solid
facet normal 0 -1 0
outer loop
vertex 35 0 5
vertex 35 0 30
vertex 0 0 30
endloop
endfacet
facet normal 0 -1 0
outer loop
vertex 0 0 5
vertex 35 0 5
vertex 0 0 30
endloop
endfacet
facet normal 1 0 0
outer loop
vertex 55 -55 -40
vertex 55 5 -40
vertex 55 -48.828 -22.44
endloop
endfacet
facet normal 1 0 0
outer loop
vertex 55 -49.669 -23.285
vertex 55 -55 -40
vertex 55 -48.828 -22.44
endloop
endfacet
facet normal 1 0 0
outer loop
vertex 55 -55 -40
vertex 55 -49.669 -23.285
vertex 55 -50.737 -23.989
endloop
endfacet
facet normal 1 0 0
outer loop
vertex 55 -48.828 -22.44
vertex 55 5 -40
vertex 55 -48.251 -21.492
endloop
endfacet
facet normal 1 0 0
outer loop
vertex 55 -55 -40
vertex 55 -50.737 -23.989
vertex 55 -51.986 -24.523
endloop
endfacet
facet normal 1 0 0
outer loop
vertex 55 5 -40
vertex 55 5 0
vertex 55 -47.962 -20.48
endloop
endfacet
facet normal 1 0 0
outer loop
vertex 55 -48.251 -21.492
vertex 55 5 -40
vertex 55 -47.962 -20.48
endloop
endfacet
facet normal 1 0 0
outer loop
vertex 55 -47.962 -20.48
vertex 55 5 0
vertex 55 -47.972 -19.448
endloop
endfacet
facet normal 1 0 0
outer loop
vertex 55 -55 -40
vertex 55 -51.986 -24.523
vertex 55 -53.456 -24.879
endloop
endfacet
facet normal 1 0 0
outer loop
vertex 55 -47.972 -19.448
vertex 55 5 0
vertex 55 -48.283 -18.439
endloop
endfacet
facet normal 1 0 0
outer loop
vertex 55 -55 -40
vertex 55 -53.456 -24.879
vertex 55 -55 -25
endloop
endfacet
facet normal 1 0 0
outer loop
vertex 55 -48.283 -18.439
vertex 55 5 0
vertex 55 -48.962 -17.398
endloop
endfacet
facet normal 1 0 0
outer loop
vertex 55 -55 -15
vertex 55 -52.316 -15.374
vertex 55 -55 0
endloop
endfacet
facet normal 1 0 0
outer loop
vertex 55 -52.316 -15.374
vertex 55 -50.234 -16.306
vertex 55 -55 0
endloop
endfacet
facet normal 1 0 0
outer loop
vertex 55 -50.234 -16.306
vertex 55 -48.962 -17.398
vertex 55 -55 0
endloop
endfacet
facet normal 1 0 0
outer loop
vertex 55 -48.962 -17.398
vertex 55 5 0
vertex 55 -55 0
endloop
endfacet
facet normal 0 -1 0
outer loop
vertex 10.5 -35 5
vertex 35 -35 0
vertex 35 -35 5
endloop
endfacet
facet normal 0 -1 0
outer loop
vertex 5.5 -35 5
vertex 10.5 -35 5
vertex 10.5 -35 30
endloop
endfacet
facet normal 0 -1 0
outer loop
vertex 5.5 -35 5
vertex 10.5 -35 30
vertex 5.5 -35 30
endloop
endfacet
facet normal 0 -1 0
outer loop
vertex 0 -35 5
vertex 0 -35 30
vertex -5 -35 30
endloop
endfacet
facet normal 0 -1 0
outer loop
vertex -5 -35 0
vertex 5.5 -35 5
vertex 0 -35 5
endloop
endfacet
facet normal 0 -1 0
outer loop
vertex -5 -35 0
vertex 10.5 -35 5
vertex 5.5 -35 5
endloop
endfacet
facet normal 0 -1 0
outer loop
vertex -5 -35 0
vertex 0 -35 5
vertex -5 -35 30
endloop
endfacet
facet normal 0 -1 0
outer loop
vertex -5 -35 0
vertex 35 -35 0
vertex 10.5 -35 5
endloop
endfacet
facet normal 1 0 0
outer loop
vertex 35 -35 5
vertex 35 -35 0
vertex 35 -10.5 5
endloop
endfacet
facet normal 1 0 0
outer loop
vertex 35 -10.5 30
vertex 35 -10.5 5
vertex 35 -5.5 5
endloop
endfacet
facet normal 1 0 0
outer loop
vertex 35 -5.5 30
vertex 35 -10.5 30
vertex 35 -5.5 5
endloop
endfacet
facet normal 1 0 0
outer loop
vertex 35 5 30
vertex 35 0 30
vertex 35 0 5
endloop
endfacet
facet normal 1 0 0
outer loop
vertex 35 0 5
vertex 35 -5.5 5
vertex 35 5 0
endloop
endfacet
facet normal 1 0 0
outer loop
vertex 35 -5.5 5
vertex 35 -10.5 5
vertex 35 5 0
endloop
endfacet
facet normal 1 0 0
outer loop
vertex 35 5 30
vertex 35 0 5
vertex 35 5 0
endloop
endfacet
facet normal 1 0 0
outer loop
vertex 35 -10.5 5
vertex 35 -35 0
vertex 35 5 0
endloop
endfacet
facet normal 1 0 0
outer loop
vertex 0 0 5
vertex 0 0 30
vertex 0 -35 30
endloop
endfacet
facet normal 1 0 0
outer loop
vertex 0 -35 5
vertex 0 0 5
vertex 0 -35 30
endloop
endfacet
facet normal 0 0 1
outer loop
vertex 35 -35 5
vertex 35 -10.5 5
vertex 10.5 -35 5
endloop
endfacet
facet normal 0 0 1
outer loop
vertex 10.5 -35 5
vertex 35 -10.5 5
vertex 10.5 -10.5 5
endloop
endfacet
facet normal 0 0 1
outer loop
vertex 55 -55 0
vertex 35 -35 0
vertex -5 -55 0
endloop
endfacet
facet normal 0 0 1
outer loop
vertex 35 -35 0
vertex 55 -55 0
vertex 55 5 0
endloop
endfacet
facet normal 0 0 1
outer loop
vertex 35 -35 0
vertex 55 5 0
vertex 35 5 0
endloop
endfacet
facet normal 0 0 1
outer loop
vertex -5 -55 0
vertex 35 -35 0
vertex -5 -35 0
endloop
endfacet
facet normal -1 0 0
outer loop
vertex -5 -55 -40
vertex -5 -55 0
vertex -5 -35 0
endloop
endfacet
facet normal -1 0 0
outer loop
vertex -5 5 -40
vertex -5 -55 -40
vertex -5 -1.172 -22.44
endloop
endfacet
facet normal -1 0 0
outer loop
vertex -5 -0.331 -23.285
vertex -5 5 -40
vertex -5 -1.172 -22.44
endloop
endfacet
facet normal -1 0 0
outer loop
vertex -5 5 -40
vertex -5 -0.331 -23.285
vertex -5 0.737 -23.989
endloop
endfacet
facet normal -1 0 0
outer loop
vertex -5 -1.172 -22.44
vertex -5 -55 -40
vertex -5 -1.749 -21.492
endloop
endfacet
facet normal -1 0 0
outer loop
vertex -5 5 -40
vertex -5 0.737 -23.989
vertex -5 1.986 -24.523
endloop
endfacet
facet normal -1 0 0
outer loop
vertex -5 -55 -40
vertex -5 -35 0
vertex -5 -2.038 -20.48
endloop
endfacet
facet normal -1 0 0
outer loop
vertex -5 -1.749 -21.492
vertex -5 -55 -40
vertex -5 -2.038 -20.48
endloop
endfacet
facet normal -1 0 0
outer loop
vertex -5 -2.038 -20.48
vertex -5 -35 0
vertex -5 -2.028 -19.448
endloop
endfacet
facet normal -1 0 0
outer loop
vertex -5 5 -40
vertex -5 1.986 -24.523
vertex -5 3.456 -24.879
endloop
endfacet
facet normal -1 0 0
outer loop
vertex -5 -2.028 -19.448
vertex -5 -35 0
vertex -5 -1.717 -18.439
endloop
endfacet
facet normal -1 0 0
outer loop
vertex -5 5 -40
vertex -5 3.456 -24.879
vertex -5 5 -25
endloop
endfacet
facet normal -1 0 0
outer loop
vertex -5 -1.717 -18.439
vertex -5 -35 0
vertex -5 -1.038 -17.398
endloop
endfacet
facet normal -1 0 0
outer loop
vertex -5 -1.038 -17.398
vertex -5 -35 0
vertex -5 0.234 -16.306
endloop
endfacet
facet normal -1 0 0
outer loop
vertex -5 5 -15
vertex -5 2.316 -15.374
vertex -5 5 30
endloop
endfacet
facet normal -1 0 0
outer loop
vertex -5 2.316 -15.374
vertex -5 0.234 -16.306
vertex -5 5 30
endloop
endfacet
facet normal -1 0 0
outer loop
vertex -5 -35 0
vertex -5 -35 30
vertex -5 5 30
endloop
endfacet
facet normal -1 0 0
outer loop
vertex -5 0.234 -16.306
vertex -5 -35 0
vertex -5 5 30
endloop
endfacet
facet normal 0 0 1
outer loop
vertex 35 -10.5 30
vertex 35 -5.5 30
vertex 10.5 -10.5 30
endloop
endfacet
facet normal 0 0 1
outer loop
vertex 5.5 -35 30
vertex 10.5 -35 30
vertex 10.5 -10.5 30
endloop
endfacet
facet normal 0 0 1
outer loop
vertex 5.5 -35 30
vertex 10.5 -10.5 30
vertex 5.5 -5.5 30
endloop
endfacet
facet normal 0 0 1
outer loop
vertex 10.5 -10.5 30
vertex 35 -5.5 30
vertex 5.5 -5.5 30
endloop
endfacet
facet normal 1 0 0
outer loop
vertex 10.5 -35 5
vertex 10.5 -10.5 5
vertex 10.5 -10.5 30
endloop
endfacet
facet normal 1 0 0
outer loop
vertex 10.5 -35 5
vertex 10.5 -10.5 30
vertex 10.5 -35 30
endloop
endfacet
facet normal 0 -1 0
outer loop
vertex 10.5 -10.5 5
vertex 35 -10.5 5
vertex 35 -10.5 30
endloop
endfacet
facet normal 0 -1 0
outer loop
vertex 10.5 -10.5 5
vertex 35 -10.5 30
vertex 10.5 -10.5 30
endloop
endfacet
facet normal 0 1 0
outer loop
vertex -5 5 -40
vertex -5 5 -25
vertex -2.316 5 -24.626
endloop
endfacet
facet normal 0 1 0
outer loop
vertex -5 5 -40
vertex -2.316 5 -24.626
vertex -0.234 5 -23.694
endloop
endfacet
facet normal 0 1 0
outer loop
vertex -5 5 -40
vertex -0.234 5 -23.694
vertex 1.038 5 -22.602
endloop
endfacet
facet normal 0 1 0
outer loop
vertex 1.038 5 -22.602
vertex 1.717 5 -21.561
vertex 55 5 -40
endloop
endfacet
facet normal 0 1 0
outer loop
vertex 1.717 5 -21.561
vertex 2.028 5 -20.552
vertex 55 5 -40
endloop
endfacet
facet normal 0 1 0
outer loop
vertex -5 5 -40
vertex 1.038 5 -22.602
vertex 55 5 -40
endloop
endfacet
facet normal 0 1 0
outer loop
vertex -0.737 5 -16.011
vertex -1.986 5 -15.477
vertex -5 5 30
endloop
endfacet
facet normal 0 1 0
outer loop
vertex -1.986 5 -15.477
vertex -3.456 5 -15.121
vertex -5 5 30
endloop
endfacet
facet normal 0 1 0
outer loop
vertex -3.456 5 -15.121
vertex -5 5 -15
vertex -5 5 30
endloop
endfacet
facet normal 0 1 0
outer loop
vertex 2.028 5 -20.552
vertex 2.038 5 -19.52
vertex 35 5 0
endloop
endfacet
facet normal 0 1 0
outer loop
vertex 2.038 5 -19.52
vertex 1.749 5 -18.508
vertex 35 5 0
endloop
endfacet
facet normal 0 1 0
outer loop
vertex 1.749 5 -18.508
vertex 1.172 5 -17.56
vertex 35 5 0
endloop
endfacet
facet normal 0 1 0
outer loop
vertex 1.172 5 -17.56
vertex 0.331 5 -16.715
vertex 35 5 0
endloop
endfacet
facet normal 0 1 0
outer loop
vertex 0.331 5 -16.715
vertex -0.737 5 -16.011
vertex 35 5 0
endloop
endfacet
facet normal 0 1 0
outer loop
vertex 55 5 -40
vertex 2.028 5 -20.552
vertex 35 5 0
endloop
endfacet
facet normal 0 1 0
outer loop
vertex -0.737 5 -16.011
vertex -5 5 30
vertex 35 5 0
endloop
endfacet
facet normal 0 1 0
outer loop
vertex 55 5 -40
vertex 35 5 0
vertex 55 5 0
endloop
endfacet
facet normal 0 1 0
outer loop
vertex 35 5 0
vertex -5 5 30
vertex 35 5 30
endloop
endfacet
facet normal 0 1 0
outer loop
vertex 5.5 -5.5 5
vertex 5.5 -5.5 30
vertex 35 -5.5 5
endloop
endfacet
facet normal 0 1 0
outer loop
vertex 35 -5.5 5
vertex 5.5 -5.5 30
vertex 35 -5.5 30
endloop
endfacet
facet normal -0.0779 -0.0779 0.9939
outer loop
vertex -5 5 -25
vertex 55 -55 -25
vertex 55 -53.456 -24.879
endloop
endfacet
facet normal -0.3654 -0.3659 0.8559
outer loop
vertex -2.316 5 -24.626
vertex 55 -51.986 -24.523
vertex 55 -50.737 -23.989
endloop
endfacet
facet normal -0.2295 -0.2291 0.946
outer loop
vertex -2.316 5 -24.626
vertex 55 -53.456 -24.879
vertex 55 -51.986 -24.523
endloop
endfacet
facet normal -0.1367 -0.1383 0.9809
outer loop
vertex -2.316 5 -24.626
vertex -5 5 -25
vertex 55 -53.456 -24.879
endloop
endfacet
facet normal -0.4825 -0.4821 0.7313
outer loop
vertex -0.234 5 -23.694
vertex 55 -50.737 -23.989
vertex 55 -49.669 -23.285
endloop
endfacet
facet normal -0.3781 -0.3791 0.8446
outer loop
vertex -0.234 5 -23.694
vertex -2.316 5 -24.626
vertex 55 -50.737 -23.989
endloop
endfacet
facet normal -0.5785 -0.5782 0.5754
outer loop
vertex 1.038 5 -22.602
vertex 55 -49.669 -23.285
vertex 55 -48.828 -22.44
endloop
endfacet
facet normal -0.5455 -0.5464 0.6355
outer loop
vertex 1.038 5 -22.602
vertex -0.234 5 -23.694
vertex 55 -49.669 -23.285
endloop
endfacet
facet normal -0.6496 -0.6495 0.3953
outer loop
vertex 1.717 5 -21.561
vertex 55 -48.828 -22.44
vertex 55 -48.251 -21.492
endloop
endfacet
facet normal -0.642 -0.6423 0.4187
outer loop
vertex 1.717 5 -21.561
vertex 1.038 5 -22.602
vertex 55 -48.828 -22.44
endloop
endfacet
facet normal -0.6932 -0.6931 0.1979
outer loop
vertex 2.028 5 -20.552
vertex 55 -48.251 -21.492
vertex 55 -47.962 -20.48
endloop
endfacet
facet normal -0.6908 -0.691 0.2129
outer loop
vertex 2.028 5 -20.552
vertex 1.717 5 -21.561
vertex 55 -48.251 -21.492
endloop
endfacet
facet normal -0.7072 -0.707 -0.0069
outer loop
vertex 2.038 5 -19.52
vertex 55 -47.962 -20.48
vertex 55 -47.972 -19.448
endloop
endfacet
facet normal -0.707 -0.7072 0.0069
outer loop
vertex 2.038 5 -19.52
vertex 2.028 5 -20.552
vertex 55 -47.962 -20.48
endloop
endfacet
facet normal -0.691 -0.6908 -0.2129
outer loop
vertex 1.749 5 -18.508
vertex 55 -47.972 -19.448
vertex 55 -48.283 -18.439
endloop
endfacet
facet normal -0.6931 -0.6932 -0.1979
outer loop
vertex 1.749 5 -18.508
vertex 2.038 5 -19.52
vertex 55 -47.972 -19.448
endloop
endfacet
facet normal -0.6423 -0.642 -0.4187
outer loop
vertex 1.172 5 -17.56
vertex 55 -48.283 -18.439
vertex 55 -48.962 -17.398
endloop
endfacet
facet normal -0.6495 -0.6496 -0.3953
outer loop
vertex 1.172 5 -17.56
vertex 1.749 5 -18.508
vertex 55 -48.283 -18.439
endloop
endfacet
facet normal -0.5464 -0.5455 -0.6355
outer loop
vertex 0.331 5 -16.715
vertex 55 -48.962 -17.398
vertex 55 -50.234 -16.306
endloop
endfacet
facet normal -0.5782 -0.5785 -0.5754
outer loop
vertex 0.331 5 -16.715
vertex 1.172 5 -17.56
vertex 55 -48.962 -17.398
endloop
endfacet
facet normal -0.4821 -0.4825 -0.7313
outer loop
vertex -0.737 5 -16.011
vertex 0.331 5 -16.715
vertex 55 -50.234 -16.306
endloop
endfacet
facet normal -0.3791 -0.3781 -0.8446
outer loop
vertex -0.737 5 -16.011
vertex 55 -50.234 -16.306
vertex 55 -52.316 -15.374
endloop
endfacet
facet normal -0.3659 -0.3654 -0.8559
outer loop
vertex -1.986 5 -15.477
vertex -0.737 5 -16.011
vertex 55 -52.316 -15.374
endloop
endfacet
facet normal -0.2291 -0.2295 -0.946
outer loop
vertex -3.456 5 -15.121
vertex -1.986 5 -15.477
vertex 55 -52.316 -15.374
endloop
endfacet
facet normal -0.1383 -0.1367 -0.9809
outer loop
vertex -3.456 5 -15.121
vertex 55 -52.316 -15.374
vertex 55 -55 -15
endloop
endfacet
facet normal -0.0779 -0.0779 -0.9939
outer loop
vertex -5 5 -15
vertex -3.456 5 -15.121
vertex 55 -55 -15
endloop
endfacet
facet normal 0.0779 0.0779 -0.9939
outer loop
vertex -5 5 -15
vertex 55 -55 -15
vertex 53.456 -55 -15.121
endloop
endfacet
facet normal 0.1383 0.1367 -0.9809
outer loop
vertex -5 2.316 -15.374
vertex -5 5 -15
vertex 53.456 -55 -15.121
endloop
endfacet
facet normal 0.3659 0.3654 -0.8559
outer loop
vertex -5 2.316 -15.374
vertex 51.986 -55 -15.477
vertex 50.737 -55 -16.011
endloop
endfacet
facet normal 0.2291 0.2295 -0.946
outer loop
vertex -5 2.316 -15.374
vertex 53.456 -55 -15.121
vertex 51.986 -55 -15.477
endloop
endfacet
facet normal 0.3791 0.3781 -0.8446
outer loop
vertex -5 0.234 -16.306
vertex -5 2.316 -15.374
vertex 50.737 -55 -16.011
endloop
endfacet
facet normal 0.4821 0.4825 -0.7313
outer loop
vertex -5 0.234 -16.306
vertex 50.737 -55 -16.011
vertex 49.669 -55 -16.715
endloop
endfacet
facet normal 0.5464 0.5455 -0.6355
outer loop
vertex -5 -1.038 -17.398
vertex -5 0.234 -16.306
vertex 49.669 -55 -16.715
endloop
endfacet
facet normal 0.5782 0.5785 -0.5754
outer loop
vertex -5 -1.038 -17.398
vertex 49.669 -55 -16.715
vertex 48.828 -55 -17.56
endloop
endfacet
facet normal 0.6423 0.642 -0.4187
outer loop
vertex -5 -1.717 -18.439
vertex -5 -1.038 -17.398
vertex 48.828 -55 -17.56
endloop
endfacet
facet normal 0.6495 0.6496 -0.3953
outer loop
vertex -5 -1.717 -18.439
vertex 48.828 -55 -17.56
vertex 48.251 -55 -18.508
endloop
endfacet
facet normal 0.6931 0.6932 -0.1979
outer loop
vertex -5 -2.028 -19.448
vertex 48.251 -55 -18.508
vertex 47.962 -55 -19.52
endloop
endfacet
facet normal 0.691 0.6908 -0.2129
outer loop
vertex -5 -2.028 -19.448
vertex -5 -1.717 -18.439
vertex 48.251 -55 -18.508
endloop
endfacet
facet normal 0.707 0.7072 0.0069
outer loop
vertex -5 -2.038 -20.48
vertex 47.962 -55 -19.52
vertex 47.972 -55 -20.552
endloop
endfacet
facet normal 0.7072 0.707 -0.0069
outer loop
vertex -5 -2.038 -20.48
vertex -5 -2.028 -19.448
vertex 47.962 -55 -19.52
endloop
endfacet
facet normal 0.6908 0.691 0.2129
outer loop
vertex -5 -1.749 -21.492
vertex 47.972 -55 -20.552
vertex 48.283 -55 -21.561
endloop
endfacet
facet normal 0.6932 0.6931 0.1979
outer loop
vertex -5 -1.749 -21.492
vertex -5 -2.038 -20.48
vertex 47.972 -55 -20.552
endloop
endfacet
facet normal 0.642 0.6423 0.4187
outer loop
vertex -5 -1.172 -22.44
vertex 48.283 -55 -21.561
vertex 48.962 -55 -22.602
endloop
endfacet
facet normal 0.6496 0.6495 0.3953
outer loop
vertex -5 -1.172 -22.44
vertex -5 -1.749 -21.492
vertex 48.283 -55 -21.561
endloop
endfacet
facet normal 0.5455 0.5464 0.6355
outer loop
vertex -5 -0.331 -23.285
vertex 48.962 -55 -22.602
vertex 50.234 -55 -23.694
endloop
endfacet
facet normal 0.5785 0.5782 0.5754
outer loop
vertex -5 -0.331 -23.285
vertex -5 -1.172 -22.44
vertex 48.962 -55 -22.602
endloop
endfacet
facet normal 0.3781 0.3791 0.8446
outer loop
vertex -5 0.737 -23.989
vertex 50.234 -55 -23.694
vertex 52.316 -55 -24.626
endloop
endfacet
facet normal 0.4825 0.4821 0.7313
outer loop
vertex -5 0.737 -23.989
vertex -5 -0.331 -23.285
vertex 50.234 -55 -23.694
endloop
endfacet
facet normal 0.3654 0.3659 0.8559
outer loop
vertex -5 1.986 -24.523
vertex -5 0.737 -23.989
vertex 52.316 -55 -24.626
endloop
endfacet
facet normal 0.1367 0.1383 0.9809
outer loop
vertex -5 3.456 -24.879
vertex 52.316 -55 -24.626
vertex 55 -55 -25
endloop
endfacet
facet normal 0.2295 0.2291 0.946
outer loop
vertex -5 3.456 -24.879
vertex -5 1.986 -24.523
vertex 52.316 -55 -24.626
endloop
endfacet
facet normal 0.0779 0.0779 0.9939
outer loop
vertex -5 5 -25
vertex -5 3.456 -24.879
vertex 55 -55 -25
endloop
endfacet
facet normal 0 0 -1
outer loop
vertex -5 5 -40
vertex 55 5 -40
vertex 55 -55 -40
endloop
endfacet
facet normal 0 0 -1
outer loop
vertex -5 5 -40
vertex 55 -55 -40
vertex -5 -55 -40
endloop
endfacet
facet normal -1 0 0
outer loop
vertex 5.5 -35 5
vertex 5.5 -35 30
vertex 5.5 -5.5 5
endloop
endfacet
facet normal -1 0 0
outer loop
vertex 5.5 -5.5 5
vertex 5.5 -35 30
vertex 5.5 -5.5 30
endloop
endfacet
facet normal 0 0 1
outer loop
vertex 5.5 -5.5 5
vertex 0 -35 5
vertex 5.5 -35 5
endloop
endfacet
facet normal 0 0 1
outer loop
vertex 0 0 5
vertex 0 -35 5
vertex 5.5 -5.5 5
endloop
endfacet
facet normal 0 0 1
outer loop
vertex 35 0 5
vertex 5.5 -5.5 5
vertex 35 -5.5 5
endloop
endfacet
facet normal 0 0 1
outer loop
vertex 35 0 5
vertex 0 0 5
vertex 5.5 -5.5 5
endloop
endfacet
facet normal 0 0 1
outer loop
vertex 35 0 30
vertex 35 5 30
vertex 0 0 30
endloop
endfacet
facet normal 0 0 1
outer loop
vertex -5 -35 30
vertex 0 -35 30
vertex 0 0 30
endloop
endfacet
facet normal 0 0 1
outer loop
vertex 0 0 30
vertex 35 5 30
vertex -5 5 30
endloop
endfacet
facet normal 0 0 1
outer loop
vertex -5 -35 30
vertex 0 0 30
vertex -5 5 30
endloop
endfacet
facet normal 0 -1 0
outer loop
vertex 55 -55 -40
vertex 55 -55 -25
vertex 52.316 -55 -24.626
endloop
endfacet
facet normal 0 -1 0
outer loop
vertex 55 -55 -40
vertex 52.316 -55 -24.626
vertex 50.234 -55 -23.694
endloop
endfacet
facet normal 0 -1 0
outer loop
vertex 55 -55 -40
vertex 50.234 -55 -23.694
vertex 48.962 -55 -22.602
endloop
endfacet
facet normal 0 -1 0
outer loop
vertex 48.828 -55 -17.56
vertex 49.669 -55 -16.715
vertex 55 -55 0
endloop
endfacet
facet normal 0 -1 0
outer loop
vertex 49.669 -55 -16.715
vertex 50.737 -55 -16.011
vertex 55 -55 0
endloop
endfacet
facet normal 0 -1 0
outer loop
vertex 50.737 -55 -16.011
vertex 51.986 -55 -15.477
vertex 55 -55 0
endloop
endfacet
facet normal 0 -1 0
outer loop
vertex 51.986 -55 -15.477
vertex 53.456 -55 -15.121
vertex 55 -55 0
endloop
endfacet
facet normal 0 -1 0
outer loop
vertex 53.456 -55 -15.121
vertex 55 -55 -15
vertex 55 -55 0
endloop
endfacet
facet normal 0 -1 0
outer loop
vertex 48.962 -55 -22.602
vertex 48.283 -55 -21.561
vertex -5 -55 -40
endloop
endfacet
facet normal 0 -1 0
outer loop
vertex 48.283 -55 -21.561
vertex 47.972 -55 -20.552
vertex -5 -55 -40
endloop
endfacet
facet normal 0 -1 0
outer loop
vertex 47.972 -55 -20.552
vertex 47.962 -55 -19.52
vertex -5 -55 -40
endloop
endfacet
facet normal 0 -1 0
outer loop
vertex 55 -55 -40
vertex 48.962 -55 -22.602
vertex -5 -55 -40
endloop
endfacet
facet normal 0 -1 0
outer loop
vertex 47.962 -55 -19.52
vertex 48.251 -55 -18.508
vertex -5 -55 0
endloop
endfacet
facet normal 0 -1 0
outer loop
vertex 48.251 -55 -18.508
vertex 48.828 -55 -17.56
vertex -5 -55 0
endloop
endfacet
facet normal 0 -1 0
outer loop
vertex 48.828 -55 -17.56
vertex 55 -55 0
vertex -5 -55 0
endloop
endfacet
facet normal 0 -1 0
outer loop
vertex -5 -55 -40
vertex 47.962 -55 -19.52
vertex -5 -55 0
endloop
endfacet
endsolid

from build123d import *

# Parameters (mm, degrees)
SALIENTE_EXTRUIR1_DEPTH    = 30
CORTAR_EXTRUIR1_DEPTH      = 25
CROQUIS4_W                 = 24.5
CROQUIS4_H                 = 24.5
SALIENTE_EXTRUIR2_DEPTH    = 5
CROQUIS5_W                 = 40
CROQUIS5_H                 = 40
CROQUIS5_W_2               = 20
SALIENTE_EXTRUIR4_DEPTH    = 40
CORTAR_EXTRUIR5_DEPTH      = 59.309518948
CORTAR_EXTRUIR5_DEPTH_BACK = 59.309518948
CROQUIS9_R                 = 5


with BuildPart() as part:
    # Croquis1 → Saliente-Extruir1 (new body)
    with BuildSketch(Plane.XY):
        Polygon((-5, 5), (35, 5), (35, -10.5), (10.5, -10.5), (10.5, -35), (-5, -35), align=None)
    extrude(amount=SALIENTE_EXTRUIR1_DEPTH)

    # Croquis3 → Cortar-Extruir1 (cut)
    with BuildSketch(Plane.XY.offset(30)):
        Polygon((0, -30), (0, -35), (5.5, -35), (5.5, -30), (5.5, -5.5), (30, -5.5), (35, -5.5), (35, 0), (30, 0), (0, 0), align=None)
    extrude(amount=-CORTAR_EXTRUIR1_DEPTH, mode=Mode.SUBTRACT)

    # Croquis4 → Saliente-Extruir2 (add)
    with BuildSketch(Plane(origin=(0, 0, 0), x_dir=(-1, 0, 0), z_dir=(0, 0, -1))):
        with Locations((-22.75, -22.75)):
            Rectangle(CROQUIS4_W, CROQUIS4_H)
    extrude(amount=-SALIENTE_EXTRUIR2_DEPTH)

    # Croquis5 → Saliente-Extruir4 (add)
    with BuildSketch(Plane(origin=(0, 0, 0), x_dir=(-1, 0, 0), z_dir=(0, 0, -1))):
        with Locations((-15, -15)):
            Rectangle(CROQUIS5_W, CROQUIS5_H)
        with Locations((-45, -15)):
            Rectangle(CROQUIS5_W_2, CROQUIS5_H)
        Polygon((5, -55), (5, -35), (-35, -35), (-55, -35), (-55, -55), align=None)
    extrude(amount=SALIENTE_EXTRUIR4_DEPTH)

    # Croquis9 → Cortar-Extruir5 (cut, two sides: drawn at the far end of the back side and taken through both)
    with BuildSketch(Plane(origin=(25, -25, 0), x_dir=(0, 0, 1), z_dir=(0.7071067811865487, -0.7071067811865465, 0)).offset(-CORTAR_EXTRUIR5_DEPTH_BACK)):
        with Locations(Location((-20, 0, 0), (0, 0, 180))):
            Circle(CROQUIS9_R)
    extrude(amount=CORTAR_EXTRUIR5_DEPTH + CORTAR_EXTRUIR5_DEPTH_BACK, mode=Mode.SUBTRACT)


solid = part.part
